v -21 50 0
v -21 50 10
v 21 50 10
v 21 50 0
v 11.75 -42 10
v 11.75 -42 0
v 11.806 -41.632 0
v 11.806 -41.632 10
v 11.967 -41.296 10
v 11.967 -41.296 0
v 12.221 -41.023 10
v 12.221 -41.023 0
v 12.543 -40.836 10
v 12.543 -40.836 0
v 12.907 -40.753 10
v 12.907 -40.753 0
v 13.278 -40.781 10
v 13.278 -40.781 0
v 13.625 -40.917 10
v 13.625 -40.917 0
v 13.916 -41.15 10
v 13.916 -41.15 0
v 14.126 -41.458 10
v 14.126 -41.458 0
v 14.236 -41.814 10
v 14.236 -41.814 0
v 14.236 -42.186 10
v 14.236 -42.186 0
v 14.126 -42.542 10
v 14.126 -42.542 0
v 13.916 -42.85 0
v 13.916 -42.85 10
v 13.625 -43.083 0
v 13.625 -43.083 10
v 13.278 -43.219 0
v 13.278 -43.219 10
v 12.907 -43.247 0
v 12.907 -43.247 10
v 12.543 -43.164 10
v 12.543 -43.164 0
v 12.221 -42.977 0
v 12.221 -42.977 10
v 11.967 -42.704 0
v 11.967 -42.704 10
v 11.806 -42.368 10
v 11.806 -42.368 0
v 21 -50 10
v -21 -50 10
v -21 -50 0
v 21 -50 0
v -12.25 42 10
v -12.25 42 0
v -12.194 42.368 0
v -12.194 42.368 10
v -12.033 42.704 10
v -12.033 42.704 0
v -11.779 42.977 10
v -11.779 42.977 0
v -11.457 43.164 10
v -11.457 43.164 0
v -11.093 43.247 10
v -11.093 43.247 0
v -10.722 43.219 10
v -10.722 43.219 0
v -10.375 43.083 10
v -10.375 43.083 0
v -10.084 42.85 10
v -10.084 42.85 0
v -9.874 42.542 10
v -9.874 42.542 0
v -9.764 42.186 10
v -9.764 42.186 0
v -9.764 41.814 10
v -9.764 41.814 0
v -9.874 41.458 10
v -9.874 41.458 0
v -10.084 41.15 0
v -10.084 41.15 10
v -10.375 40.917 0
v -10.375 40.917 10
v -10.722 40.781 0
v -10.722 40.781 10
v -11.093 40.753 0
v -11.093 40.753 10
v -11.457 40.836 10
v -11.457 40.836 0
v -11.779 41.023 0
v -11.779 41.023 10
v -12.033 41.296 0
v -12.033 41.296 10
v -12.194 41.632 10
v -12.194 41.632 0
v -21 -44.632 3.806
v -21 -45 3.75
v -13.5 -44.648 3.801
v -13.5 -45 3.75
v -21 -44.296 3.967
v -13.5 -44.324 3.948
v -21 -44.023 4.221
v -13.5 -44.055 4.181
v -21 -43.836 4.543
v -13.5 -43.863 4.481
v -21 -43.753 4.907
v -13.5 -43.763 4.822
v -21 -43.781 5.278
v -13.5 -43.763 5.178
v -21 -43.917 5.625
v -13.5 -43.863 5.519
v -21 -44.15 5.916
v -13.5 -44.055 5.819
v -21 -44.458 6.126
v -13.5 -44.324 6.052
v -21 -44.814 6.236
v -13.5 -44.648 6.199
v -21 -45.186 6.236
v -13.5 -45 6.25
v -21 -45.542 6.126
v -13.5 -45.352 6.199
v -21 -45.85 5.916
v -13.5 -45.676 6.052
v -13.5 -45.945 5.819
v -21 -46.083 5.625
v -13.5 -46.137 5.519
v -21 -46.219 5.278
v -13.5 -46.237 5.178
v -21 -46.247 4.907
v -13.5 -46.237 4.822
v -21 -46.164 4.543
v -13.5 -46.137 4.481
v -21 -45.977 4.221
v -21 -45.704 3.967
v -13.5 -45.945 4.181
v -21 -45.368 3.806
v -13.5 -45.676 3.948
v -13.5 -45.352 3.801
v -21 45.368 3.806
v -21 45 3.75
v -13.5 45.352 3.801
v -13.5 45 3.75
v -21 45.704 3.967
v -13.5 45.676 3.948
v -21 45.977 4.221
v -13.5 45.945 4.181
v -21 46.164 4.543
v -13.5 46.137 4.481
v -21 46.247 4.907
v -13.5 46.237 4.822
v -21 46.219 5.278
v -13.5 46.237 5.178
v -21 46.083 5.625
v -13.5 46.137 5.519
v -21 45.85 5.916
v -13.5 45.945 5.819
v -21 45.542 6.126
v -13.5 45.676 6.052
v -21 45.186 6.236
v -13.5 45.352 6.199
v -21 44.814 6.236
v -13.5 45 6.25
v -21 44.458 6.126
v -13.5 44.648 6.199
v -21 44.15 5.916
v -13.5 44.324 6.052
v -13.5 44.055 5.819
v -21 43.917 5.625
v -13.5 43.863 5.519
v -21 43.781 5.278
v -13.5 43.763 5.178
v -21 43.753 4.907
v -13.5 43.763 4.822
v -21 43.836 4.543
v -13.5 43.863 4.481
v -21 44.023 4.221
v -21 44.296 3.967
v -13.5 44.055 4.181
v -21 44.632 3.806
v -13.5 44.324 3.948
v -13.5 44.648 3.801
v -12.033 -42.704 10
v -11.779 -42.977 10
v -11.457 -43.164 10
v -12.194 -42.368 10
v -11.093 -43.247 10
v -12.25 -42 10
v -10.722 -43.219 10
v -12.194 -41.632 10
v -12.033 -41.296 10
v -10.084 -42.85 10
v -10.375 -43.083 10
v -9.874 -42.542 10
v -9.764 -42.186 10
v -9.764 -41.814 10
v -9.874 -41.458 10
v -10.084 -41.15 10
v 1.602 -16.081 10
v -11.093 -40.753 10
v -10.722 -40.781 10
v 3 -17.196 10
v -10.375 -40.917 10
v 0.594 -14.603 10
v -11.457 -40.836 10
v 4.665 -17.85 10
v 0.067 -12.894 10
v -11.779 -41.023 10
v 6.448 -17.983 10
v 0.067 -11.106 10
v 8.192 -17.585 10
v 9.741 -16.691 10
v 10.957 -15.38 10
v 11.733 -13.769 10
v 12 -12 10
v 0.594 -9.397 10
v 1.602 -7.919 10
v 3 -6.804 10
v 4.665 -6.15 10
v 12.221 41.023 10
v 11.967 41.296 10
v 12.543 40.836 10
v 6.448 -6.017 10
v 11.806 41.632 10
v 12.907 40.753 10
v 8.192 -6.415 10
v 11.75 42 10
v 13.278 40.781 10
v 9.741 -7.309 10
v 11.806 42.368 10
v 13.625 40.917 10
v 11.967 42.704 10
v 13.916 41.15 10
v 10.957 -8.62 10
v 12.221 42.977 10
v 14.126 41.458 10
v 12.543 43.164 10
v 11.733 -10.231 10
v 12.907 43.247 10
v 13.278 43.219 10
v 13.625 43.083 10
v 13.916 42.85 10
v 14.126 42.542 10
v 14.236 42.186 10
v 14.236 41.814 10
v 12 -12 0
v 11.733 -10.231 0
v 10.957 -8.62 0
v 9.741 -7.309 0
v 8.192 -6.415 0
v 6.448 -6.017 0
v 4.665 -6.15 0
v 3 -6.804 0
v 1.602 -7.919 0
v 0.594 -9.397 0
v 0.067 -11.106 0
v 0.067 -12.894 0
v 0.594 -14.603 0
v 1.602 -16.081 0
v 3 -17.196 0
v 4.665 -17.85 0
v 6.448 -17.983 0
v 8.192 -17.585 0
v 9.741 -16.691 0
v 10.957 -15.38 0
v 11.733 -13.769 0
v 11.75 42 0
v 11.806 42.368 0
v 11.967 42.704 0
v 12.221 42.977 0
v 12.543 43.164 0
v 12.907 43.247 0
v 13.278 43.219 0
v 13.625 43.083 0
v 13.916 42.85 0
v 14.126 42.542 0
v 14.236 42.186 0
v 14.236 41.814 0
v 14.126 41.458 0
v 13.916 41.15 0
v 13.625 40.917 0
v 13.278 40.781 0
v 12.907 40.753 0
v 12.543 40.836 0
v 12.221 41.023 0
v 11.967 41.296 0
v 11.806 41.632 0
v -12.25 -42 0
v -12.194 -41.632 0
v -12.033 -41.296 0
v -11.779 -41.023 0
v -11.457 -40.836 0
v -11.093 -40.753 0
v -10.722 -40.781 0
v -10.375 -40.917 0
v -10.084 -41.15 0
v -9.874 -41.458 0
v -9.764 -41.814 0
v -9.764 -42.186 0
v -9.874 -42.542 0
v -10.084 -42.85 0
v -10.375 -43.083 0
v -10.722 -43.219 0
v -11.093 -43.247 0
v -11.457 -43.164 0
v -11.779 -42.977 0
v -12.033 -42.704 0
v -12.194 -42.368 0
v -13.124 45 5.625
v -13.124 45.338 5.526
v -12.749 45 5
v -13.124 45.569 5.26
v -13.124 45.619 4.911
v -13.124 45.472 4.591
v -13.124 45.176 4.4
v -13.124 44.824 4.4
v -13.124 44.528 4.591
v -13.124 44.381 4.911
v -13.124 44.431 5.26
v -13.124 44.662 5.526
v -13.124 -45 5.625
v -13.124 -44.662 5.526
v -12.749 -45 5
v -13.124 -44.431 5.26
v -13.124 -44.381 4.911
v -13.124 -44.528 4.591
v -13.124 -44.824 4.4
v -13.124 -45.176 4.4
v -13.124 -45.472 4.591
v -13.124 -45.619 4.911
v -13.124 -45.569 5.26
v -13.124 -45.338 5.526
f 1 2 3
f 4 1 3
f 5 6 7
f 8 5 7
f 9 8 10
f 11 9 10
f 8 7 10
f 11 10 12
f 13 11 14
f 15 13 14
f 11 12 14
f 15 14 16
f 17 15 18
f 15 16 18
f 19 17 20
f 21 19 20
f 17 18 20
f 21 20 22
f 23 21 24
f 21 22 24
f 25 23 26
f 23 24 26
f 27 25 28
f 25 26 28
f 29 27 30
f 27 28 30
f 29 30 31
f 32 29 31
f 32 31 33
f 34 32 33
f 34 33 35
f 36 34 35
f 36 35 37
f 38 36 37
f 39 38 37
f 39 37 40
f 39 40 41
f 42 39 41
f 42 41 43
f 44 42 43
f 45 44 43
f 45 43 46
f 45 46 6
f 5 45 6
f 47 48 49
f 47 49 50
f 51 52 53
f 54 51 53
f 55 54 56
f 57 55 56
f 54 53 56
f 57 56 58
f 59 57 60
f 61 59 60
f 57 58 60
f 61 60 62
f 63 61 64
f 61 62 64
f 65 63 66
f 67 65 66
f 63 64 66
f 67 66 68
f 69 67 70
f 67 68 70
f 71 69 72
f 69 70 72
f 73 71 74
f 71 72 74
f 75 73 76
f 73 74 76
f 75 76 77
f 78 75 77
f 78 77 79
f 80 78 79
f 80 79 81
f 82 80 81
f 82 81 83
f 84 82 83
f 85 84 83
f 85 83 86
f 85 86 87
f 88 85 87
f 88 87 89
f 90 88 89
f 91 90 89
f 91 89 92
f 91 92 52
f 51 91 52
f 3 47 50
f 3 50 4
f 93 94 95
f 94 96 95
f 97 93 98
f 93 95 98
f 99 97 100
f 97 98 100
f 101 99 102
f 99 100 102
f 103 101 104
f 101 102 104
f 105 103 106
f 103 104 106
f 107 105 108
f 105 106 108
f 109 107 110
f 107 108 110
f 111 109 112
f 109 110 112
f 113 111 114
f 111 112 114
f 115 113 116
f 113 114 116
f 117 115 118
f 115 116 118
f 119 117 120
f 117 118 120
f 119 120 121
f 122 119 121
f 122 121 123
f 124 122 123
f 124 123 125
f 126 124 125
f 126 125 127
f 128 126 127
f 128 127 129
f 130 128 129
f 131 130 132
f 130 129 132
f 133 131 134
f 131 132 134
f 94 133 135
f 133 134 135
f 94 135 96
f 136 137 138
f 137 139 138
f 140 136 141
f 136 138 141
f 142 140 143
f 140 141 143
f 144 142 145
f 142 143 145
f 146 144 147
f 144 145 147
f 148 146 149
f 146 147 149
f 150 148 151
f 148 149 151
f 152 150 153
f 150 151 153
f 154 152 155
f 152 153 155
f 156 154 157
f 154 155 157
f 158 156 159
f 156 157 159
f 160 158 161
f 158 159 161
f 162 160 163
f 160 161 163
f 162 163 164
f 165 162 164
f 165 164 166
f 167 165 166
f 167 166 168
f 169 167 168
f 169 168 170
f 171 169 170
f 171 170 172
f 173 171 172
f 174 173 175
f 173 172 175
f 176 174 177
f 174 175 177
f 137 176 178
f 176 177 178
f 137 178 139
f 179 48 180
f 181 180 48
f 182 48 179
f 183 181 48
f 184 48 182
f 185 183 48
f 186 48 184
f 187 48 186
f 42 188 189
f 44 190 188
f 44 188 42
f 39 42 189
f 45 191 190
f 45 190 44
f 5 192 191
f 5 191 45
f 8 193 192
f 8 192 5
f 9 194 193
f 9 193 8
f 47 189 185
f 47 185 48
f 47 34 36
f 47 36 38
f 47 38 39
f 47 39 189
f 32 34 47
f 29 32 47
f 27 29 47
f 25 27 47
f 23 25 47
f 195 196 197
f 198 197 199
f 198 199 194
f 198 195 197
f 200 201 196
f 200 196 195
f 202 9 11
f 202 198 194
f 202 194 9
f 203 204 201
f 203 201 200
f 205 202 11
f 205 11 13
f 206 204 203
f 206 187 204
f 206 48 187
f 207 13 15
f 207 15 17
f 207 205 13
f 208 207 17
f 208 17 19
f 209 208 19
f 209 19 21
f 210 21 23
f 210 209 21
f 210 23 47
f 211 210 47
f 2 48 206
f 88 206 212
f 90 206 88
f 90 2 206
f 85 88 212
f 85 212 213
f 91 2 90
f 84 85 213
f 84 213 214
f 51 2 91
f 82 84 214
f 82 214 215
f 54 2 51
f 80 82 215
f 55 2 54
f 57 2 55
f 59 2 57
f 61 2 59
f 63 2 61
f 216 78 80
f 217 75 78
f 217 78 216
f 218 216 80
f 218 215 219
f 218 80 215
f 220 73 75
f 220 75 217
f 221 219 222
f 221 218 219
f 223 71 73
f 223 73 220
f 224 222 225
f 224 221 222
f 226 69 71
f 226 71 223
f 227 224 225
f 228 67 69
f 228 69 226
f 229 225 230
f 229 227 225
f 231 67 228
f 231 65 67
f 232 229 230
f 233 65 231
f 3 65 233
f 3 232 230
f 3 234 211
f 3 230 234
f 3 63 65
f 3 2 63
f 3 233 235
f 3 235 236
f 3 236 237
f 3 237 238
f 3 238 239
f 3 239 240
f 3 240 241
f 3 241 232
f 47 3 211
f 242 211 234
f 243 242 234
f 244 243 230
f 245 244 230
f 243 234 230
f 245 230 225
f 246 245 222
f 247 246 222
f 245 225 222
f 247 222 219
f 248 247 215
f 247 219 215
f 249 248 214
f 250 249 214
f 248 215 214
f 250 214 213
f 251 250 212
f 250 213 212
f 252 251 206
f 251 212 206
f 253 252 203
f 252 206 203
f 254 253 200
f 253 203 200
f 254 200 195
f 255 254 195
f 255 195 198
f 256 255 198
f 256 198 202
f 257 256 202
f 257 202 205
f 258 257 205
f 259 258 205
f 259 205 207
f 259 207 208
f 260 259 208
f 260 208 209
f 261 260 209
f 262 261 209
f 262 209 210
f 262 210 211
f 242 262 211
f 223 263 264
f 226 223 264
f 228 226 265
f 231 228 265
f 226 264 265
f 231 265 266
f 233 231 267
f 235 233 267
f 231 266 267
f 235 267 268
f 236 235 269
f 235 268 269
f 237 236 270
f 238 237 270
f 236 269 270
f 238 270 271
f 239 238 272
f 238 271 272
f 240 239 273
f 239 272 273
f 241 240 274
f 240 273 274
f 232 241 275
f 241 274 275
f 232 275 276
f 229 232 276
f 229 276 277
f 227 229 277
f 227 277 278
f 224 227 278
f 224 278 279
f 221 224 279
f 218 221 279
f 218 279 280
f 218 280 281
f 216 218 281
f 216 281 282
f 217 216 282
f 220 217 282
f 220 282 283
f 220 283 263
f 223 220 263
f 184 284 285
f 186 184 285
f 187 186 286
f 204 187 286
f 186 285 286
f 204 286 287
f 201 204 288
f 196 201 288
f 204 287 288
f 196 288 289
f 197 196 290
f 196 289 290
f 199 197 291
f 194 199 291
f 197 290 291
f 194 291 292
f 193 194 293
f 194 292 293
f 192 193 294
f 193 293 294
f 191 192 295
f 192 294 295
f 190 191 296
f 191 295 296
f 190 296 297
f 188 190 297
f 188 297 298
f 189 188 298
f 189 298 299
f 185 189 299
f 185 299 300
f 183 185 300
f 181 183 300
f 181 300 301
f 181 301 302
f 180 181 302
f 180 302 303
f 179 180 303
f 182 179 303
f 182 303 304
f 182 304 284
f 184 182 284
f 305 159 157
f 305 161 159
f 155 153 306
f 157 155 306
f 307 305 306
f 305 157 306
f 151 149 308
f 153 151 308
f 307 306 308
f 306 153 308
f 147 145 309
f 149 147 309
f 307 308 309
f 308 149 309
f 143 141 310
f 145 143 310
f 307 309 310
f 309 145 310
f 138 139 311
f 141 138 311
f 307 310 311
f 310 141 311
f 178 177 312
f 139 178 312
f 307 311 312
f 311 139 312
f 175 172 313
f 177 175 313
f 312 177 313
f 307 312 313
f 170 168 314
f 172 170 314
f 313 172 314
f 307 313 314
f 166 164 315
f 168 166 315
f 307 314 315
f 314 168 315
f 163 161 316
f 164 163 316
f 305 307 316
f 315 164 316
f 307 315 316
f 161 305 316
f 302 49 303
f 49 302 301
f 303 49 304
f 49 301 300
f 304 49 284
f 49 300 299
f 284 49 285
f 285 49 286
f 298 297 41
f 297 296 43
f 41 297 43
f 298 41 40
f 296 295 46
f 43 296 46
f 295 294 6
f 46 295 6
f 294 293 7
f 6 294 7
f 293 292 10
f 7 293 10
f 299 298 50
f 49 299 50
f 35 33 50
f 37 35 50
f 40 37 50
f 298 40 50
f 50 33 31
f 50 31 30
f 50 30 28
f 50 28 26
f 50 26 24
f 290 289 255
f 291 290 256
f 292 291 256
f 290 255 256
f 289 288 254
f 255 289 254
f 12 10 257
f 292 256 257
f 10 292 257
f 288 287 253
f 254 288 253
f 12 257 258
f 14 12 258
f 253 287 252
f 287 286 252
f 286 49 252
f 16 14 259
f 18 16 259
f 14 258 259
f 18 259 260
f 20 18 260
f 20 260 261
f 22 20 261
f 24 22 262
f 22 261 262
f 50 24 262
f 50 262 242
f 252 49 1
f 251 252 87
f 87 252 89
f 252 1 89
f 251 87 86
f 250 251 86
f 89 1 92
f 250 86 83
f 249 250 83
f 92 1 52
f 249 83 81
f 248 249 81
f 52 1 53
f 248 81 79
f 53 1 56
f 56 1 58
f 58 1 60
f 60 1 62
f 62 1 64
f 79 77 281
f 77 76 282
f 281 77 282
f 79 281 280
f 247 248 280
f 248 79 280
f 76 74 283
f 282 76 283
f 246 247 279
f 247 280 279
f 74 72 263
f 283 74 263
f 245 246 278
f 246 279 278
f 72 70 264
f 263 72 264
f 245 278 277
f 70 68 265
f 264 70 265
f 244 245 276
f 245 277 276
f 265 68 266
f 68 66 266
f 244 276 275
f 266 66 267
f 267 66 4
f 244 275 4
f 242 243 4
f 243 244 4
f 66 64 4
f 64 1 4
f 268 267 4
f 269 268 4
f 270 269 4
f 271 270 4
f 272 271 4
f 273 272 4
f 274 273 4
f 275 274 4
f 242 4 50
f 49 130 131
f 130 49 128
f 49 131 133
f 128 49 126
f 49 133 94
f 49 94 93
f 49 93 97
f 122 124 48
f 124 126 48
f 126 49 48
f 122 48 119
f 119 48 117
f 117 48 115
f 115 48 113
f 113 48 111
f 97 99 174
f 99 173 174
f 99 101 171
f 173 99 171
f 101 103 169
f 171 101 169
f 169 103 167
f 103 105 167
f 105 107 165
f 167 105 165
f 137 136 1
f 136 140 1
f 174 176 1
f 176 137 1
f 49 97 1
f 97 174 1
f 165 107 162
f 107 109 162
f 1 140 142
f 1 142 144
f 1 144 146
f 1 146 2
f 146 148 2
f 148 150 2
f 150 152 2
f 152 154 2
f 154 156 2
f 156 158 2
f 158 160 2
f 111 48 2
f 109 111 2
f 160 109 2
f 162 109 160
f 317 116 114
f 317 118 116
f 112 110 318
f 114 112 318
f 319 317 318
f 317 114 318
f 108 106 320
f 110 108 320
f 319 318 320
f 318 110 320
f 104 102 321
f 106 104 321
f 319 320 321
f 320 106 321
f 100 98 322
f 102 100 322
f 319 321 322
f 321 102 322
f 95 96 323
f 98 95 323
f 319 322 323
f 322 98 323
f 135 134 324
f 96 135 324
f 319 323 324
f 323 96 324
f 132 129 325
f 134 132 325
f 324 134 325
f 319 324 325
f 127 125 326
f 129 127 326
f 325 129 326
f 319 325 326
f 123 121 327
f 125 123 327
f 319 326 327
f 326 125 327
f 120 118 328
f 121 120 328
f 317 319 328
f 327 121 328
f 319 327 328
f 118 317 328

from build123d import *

# Parameters (mm, degrees)
SKETCH1_W                      = 42
SKETCH1_H                      = 100
BOSS_EXTRUDE1_DEPTH            = 10
F_12_0_12_DIAMETER_HOLE1_D     = 12
F_2_5_2_5_DIAMETER_HOLE1_D     = 2.5
F_2_5_2_5_DIAMETER_HOLE2_D     = 2.5
F_2_5_2_5_DIAMETER_HOLE2_DEPTH = 7.5
F_2_5_2_5_DIAMETER_HOLE2_TIP   = 0.751075774


with BuildPart() as part:
    # Sketch1 → Boss-Extrude1 (new body)
    with BuildSketch(Plane.XY.offset(10)):
        Rectangle(SKETCH1_W, SKETCH1_H)
    extrude(amount=-BOSS_EXTRUDE1_DEPTH)

    # Ø12.0 (12) Diameter Hole1 (through all)
    with Locations(Plane(origin=(0, 0, 0), x_dir=(-1, 0, 0), z_dir=(0, 0, -1))):
        with Locations((-6, -12)):
            Hole(F_12_0_12_DIAMETER_HOLE1_D / 2)

    # Ø2.5 (2.5) Diameter Hole1 (through all)
    with Locations(Plane.XY.offset(10)):
        with Locations((13, 42), (-11, 42), (-11, -42), (13, -42)):
            Hole(F_2_5_2_5_DIAMETER_HOLE1_D / 2)

    # Ø2.5 (2.5) Diameter Hole2
    with Locations(Plane.ZY.offset(21)):
        with Locations((5, 45), (5, -45)):
            Hole(F_2_5_2_5_DIAMETER_HOLE2_D / 2, depth=F_2_5_2_5_DIAMETER_HOLE2_DEPTH)
            with Locations((0, 0, -(F_2_5_2_5_DIAMETER_HOLE2_DEPTH + F_2_5_2_5_DIAMETER_HOLE2_TIP / 2))):  # 118° drill point
                Cone(0, F_2_5_2_5_DIAMETER_HOLE2_D / 2, F_2_5_2_5_DIAMETER_HOLE2_TIP, mode=Mode.SUBTRACT)


solid = part.part
